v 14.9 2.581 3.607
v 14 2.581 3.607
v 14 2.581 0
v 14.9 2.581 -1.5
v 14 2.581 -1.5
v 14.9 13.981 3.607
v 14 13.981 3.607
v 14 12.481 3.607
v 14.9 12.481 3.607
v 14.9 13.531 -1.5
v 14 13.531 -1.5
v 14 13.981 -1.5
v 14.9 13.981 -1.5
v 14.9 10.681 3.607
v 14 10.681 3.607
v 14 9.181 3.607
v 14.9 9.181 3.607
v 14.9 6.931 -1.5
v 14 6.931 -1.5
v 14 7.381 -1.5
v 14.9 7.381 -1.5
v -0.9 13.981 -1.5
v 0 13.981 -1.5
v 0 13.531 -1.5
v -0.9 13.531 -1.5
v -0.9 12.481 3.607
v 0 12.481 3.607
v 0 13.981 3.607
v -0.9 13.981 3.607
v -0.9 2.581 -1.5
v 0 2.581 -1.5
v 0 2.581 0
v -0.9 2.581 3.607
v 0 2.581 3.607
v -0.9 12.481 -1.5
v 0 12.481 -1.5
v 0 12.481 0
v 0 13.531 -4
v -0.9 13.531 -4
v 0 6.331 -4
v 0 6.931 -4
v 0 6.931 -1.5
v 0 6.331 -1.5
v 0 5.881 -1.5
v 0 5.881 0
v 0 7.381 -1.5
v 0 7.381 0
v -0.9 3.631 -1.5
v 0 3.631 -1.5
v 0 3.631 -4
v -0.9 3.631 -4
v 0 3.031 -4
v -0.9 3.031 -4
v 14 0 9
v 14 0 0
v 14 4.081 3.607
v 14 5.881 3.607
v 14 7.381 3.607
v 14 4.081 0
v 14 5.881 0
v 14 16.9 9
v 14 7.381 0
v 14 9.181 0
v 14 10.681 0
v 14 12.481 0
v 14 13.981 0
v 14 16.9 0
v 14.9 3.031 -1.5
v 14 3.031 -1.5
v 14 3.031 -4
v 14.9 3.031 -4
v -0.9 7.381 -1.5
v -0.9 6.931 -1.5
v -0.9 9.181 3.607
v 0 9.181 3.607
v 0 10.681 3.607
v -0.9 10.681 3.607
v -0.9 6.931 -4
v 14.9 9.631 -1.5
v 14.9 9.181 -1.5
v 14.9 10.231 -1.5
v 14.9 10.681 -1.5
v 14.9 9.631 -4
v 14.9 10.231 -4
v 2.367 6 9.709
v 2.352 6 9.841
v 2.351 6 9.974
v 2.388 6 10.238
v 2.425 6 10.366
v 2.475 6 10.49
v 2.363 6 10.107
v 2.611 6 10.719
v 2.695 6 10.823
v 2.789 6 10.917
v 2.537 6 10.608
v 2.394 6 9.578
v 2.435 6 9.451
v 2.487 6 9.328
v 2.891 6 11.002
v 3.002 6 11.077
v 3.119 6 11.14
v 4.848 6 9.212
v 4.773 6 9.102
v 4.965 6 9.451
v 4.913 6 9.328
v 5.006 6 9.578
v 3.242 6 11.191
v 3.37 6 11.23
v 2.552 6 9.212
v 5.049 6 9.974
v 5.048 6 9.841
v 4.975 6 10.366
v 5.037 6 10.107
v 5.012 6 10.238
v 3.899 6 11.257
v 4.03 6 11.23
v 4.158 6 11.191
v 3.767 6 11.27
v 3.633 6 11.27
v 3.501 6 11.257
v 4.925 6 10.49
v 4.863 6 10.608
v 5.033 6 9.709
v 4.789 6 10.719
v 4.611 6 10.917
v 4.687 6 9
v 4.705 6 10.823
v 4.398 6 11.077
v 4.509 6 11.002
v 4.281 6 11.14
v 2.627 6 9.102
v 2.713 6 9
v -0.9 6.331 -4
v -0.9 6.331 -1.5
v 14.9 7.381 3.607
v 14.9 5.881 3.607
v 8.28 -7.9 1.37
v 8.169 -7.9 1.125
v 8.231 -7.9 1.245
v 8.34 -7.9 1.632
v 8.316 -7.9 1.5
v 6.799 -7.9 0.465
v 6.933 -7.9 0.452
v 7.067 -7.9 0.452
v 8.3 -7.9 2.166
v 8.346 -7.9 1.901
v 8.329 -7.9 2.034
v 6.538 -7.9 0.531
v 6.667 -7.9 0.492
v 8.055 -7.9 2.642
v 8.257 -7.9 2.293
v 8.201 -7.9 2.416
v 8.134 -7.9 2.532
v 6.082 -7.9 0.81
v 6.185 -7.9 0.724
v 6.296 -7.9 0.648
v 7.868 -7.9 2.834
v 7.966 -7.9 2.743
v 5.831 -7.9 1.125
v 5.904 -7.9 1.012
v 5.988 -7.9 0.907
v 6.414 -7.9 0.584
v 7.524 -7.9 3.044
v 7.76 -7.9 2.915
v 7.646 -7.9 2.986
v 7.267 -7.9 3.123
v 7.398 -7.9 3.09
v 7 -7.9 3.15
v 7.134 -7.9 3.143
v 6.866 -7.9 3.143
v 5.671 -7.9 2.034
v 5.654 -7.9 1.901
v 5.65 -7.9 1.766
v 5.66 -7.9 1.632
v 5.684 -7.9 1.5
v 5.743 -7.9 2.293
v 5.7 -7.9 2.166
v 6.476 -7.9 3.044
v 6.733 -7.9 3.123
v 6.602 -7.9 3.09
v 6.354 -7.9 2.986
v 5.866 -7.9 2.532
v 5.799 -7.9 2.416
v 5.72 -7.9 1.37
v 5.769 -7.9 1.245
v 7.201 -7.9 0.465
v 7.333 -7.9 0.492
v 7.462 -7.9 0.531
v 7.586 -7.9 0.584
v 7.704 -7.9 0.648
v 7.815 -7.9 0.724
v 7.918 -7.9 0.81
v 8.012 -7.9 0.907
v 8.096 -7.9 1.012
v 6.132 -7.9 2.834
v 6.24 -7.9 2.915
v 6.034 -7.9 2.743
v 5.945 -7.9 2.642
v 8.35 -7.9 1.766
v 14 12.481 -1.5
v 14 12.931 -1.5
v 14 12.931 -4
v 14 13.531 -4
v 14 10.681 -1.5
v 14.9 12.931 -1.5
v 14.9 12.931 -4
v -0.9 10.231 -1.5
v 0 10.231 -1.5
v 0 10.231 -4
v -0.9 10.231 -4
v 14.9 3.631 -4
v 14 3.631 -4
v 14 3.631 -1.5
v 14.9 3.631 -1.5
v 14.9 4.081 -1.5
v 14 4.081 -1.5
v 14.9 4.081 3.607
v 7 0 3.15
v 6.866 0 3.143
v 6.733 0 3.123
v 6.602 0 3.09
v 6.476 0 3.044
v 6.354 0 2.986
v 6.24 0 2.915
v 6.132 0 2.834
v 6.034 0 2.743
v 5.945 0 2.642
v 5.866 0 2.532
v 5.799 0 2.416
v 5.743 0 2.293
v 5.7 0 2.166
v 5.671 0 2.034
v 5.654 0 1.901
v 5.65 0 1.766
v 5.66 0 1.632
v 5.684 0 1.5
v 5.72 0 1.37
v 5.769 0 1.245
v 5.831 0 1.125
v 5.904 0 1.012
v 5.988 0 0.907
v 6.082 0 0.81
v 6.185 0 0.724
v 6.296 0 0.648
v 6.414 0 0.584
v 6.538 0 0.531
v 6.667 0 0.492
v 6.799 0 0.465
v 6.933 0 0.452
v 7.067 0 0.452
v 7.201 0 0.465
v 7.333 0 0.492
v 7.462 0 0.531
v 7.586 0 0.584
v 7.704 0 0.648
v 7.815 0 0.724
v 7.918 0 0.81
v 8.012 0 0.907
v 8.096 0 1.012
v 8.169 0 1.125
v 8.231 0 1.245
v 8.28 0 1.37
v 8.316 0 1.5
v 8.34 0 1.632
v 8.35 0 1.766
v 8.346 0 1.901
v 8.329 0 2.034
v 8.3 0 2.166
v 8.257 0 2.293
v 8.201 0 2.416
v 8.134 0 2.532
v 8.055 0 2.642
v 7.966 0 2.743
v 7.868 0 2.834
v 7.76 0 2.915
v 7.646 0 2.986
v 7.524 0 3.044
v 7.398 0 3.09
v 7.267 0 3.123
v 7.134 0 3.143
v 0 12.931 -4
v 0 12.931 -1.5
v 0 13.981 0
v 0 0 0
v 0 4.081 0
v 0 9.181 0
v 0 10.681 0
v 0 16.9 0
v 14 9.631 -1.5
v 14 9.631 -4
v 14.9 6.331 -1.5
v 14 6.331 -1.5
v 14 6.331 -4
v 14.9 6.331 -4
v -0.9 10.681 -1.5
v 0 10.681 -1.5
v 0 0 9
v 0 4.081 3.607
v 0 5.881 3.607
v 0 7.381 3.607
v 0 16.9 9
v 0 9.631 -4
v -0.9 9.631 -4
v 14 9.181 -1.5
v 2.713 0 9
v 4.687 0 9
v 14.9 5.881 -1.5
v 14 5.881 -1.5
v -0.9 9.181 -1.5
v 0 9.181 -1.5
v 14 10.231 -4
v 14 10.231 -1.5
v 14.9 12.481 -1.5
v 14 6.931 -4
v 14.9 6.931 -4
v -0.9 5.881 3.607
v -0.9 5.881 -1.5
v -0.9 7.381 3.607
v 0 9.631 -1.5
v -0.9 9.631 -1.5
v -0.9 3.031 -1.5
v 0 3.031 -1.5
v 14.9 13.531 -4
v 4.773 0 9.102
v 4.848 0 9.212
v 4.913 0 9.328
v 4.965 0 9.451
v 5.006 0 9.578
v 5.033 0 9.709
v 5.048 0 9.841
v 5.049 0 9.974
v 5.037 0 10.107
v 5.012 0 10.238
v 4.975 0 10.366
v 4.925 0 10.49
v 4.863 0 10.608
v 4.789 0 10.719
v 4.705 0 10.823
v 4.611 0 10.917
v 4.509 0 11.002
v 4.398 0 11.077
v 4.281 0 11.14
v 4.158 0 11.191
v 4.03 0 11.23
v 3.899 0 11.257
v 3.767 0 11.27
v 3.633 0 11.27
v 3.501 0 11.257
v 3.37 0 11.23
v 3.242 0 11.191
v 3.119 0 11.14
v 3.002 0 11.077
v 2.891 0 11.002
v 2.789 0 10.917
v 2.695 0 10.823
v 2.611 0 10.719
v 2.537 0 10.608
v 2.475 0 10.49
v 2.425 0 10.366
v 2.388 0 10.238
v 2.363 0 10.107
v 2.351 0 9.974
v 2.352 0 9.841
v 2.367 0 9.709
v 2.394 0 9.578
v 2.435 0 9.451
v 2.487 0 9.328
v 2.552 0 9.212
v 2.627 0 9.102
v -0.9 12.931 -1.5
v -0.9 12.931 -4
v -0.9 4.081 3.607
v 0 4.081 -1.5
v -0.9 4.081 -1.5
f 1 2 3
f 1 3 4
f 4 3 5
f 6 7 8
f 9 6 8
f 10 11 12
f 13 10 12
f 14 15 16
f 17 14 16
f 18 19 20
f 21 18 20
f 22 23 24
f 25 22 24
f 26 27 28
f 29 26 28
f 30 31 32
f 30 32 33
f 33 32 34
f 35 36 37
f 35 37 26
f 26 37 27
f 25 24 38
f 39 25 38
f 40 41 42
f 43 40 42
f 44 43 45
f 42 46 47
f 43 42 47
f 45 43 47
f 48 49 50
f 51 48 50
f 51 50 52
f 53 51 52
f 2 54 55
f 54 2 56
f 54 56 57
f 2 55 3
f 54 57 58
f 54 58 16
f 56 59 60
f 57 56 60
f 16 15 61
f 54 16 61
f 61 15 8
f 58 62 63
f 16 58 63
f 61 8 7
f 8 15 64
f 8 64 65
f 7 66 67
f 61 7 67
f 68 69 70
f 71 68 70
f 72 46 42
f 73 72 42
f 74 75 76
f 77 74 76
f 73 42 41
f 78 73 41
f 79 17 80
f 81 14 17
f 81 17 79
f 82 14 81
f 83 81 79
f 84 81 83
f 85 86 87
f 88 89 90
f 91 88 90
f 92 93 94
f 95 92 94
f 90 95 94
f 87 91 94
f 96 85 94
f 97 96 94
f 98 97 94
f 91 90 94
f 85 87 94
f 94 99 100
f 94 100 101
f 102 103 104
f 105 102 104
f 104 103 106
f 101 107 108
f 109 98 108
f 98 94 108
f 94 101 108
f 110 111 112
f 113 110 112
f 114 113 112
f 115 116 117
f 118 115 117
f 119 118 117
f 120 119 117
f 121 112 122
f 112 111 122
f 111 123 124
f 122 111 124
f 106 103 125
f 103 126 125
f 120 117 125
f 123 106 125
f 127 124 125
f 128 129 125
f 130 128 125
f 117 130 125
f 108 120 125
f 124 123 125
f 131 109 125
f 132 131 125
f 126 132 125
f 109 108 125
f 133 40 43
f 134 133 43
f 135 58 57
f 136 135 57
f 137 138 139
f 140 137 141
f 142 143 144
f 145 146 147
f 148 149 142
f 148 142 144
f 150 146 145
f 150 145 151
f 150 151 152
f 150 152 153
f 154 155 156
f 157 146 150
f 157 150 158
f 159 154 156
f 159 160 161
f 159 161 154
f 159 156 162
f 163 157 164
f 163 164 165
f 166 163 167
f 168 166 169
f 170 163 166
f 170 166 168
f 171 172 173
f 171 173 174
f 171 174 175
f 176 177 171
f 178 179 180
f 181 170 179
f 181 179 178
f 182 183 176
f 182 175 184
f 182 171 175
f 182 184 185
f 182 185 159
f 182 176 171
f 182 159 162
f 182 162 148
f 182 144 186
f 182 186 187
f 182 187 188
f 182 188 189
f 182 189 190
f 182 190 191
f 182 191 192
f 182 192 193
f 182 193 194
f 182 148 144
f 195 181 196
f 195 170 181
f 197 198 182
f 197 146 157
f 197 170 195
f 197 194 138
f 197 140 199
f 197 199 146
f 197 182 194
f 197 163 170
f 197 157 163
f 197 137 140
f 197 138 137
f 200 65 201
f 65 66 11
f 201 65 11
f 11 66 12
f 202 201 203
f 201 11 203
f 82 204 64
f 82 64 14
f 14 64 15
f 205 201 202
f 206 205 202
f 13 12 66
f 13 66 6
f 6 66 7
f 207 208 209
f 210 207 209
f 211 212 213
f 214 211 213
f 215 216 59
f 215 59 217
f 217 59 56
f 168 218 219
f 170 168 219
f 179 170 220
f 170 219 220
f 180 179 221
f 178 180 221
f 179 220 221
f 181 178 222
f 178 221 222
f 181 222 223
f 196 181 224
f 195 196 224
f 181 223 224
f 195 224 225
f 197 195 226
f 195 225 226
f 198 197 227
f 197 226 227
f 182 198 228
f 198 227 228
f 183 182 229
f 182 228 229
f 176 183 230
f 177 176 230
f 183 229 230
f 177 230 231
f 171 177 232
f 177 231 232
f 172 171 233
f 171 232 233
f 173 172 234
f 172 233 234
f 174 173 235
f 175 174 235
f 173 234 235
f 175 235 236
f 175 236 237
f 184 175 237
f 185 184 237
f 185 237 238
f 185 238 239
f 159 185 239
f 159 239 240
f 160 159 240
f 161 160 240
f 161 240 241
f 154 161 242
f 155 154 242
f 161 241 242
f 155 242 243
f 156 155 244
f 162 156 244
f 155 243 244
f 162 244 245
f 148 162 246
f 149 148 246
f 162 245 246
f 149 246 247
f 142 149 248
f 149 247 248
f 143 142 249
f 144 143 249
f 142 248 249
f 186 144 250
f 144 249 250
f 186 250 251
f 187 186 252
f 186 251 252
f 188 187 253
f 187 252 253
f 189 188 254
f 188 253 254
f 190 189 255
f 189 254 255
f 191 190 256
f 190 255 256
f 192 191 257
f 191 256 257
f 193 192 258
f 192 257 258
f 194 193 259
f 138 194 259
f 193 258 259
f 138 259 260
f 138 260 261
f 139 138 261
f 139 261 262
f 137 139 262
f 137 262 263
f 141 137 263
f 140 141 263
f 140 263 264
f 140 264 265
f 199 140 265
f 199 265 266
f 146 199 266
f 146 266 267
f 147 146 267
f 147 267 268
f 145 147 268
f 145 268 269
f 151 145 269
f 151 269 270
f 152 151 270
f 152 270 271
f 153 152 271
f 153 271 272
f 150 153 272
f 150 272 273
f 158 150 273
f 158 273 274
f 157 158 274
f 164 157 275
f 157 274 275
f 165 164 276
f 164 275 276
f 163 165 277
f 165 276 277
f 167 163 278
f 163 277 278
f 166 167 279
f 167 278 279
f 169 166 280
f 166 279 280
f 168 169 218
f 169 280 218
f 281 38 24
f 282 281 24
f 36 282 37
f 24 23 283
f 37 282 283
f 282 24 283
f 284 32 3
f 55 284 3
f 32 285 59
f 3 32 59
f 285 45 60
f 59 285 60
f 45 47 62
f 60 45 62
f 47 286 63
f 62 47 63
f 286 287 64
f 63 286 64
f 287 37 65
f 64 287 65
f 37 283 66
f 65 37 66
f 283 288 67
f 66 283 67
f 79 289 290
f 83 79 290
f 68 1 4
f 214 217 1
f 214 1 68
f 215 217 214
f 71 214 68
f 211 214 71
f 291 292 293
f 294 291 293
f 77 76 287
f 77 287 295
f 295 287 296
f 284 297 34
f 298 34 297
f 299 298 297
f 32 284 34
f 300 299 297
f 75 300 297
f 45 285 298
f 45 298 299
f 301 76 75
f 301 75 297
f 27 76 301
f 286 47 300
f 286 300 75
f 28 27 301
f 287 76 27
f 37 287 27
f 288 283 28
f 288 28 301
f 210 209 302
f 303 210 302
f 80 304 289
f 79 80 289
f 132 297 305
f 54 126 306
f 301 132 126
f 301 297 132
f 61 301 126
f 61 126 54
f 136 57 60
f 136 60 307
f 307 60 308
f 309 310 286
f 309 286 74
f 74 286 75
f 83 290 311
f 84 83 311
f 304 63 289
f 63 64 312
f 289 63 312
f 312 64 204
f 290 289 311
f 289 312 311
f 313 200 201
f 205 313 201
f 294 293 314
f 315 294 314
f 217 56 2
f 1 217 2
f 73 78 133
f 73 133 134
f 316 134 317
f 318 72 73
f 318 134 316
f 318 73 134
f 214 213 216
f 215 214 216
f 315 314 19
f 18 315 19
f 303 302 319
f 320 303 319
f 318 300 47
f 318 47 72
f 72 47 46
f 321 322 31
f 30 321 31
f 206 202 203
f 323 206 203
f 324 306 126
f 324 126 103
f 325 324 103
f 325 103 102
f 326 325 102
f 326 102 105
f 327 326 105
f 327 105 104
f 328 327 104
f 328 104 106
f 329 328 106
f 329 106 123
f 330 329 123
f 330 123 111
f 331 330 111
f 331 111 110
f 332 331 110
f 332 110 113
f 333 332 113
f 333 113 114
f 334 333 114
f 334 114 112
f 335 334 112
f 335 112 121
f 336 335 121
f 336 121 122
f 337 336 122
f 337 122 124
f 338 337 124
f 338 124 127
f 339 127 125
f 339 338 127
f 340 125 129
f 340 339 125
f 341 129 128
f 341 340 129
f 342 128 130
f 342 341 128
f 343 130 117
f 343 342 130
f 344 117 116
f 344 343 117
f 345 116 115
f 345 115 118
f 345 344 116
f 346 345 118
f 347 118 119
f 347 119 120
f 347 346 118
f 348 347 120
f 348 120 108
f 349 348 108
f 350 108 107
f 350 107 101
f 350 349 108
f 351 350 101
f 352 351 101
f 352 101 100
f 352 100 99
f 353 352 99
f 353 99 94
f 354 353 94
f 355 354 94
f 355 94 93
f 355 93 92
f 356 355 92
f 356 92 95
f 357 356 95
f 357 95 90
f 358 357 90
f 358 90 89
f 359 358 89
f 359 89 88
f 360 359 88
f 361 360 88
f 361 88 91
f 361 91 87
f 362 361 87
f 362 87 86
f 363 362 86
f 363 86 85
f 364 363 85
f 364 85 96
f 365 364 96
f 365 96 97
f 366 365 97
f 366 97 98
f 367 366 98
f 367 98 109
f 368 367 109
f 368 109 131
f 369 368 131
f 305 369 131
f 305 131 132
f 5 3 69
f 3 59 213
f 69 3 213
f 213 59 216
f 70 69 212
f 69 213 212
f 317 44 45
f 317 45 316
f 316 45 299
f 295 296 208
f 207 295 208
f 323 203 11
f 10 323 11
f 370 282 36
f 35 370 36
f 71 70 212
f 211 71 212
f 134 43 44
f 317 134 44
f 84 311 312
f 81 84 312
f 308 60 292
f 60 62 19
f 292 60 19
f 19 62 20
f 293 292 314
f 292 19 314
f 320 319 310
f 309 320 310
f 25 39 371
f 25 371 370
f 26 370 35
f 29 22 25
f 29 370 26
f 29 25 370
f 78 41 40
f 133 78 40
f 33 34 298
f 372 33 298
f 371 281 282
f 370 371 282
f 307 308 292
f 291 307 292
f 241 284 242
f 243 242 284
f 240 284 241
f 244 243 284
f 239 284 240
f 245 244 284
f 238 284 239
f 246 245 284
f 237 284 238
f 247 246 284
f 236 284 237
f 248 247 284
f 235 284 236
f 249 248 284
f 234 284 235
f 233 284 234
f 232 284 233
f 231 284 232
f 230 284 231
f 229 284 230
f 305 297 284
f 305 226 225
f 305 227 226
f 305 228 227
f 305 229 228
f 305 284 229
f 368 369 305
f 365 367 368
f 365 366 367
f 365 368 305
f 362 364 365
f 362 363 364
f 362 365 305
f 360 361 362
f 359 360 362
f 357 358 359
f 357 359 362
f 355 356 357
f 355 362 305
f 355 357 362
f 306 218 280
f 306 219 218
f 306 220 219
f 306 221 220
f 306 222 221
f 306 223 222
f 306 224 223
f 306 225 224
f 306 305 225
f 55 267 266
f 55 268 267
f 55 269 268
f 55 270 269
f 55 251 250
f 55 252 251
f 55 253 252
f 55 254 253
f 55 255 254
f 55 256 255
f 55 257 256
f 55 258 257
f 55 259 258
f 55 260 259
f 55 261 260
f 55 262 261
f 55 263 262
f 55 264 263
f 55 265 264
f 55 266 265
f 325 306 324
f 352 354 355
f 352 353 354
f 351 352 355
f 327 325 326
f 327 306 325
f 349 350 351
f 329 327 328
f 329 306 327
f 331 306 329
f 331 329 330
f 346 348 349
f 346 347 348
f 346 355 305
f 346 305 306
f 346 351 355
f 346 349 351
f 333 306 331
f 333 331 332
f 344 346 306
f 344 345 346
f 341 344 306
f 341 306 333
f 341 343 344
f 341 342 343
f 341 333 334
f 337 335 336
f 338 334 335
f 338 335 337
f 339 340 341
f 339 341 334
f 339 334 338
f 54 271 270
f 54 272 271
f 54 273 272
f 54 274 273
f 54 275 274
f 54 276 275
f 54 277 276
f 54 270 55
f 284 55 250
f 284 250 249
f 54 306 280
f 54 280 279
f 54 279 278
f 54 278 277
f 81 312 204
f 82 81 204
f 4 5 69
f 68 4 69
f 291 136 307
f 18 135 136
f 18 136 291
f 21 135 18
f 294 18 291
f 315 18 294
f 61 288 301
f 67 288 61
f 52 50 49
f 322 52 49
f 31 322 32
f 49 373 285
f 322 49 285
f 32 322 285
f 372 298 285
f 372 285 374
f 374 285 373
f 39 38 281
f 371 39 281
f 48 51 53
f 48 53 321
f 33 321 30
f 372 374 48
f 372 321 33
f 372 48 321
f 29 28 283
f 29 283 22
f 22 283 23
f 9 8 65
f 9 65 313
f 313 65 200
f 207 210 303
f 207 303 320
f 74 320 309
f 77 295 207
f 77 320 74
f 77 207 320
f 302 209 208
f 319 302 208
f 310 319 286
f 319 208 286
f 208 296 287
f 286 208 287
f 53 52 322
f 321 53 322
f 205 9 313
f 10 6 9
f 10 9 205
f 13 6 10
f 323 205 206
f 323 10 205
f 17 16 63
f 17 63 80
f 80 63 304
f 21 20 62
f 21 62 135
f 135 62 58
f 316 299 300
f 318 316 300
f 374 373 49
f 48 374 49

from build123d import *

# Parameters (mm, degrees)
ESQUISSE1_W          = 14
ESQUISSE1_H          = 16.9
BASE_EXTRUSION_DEPTH = 9
ESQUISSE2_R          = 1.35
BOSS_EXTRU_1_DEPTH   = 7.9
ESQUISSE3_R          = 1.35
BOSS_EXTRU_2_DEPTH   = 6
EXTRUSION1_DEPTH     = 0.9
EXTRUSION2_DEPTH     = 0.9


with BuildPart() as part:
    # Esquisse1 → Base-Extrusion (new body)
    with BuildSketch(Plane.XY):
        with Locations((7, 8.45)):
            Rectangle(ESQUISSE1_W, ESQUISSE1_H)
    extrude(amount=BASE_EXTRUSION_DEPTH)

    # Esquisse2 → Boss.-Extru.1 (add)
    with BuildSketch(Plane.XZ):
        with Locations(Location((7, 1.8, 0), (0, 0, 90))):
            Circle(ESQUISSE2_R)
    extrude(amount=BOSS_EXTRU_1_DEPTH)

    # Esquisse3 → Boss.-Extru.2 (add)
    with BuildSketch(Plane.XZ):
        with Locations((3.7, 9.921362126)):
            Circle(ESQUISSE3_R)
    extrude(amount=-BOSS_EXTRU_2_DEPTH)

    # Esquisse4 → Extrusion1 (add)
    with BuildSketch(Plane.ZY):
        Polygon((3.607457233, 13.98057371), (-1.5, 13.98057371), (-1.5, 13.53057371), (-4, 13.53057371), (-4, 12.93057371), (-1.5, 12.93057371), (-1.5, 12.48057371), (3.607457233, 12.48057371), align=None)
        Polygon((3.607457233, 10.68057371), (-1.5, 10.68057371), (-1.5, 10.23057371), (-4, 10.23057371), (-4, 9.63057371), (-1.5, 9.63057371), (-1.5, 9.18057371), (3.607457233, 9.18057371), align=None)
        Polygon((3.607457233, 7.38057371), (-1.5, 7.38057371), (-1.5, 6.93057371), (-4, 6.93057371), (-4, 6.33057371), (-1.5, 6.33057371), (-1.5, 5.88057371), (3.607457233, 5.88057371), align=None)
        Polygon((3.607457233, 4.08057371), (-1.5, 4.08057371), (-1.5, 3.63057371), (-4, 3.63057371), (-4, 3.03057371), (-1.5, 3.03057371), (-1.5, 2.58057371), (3.607457233, 2.58057371), align=None)
    extrude(amount=EXTRUSION1_DEPTH)

    # Esquisse5 → Extrusion2 (add)
    with BuildSketch(Plane(origin=(14, 0, 0), x_dir=(0, 0, -1), z_dir=(1, 0, 0))):
        Polygon((1.5, 13.98057371), (-3.607457233, 13.98057371), (-3.607457233, 12.48057371), (1.5, 12.48057371), (1.5, 12.93057371), (4, 12.93057371), (4, 13.53057371), (1.5, 13.53057371), align=None)
        Polygon((1.5, 7.38057371), (-3.607457233, 7.38057371), (-3.607457233, 5.88057371), (1.5, 5.88057371), (1.5, 6.33057371), (4, 6.33057371), (4, 6.93057371), (1.5, 6.93057371), align=None)
        Polygon((-3.607457233, 10.68057371), (-3.607457233, 9.18057371), (1.5, 9.18057371), (1.5, 9.63057371), (4, 9.63057371), (4, 10.23057371), (1.5, 10.23057371), (1.5, 10.68057371), align=None)
        Polygon((-3.607457233, 4.08057371), (-3.607457233, 2.58057371), (1.5, 2.58057371), (1.5, 3.03057371), (4, 3.03057371), (4, 3.63057371), (1.5, 3.63057371), (1.5, 4.08057371), align=None)
    extrude(amount=EXTRUSION2_DEPTH)


solid = part.part
